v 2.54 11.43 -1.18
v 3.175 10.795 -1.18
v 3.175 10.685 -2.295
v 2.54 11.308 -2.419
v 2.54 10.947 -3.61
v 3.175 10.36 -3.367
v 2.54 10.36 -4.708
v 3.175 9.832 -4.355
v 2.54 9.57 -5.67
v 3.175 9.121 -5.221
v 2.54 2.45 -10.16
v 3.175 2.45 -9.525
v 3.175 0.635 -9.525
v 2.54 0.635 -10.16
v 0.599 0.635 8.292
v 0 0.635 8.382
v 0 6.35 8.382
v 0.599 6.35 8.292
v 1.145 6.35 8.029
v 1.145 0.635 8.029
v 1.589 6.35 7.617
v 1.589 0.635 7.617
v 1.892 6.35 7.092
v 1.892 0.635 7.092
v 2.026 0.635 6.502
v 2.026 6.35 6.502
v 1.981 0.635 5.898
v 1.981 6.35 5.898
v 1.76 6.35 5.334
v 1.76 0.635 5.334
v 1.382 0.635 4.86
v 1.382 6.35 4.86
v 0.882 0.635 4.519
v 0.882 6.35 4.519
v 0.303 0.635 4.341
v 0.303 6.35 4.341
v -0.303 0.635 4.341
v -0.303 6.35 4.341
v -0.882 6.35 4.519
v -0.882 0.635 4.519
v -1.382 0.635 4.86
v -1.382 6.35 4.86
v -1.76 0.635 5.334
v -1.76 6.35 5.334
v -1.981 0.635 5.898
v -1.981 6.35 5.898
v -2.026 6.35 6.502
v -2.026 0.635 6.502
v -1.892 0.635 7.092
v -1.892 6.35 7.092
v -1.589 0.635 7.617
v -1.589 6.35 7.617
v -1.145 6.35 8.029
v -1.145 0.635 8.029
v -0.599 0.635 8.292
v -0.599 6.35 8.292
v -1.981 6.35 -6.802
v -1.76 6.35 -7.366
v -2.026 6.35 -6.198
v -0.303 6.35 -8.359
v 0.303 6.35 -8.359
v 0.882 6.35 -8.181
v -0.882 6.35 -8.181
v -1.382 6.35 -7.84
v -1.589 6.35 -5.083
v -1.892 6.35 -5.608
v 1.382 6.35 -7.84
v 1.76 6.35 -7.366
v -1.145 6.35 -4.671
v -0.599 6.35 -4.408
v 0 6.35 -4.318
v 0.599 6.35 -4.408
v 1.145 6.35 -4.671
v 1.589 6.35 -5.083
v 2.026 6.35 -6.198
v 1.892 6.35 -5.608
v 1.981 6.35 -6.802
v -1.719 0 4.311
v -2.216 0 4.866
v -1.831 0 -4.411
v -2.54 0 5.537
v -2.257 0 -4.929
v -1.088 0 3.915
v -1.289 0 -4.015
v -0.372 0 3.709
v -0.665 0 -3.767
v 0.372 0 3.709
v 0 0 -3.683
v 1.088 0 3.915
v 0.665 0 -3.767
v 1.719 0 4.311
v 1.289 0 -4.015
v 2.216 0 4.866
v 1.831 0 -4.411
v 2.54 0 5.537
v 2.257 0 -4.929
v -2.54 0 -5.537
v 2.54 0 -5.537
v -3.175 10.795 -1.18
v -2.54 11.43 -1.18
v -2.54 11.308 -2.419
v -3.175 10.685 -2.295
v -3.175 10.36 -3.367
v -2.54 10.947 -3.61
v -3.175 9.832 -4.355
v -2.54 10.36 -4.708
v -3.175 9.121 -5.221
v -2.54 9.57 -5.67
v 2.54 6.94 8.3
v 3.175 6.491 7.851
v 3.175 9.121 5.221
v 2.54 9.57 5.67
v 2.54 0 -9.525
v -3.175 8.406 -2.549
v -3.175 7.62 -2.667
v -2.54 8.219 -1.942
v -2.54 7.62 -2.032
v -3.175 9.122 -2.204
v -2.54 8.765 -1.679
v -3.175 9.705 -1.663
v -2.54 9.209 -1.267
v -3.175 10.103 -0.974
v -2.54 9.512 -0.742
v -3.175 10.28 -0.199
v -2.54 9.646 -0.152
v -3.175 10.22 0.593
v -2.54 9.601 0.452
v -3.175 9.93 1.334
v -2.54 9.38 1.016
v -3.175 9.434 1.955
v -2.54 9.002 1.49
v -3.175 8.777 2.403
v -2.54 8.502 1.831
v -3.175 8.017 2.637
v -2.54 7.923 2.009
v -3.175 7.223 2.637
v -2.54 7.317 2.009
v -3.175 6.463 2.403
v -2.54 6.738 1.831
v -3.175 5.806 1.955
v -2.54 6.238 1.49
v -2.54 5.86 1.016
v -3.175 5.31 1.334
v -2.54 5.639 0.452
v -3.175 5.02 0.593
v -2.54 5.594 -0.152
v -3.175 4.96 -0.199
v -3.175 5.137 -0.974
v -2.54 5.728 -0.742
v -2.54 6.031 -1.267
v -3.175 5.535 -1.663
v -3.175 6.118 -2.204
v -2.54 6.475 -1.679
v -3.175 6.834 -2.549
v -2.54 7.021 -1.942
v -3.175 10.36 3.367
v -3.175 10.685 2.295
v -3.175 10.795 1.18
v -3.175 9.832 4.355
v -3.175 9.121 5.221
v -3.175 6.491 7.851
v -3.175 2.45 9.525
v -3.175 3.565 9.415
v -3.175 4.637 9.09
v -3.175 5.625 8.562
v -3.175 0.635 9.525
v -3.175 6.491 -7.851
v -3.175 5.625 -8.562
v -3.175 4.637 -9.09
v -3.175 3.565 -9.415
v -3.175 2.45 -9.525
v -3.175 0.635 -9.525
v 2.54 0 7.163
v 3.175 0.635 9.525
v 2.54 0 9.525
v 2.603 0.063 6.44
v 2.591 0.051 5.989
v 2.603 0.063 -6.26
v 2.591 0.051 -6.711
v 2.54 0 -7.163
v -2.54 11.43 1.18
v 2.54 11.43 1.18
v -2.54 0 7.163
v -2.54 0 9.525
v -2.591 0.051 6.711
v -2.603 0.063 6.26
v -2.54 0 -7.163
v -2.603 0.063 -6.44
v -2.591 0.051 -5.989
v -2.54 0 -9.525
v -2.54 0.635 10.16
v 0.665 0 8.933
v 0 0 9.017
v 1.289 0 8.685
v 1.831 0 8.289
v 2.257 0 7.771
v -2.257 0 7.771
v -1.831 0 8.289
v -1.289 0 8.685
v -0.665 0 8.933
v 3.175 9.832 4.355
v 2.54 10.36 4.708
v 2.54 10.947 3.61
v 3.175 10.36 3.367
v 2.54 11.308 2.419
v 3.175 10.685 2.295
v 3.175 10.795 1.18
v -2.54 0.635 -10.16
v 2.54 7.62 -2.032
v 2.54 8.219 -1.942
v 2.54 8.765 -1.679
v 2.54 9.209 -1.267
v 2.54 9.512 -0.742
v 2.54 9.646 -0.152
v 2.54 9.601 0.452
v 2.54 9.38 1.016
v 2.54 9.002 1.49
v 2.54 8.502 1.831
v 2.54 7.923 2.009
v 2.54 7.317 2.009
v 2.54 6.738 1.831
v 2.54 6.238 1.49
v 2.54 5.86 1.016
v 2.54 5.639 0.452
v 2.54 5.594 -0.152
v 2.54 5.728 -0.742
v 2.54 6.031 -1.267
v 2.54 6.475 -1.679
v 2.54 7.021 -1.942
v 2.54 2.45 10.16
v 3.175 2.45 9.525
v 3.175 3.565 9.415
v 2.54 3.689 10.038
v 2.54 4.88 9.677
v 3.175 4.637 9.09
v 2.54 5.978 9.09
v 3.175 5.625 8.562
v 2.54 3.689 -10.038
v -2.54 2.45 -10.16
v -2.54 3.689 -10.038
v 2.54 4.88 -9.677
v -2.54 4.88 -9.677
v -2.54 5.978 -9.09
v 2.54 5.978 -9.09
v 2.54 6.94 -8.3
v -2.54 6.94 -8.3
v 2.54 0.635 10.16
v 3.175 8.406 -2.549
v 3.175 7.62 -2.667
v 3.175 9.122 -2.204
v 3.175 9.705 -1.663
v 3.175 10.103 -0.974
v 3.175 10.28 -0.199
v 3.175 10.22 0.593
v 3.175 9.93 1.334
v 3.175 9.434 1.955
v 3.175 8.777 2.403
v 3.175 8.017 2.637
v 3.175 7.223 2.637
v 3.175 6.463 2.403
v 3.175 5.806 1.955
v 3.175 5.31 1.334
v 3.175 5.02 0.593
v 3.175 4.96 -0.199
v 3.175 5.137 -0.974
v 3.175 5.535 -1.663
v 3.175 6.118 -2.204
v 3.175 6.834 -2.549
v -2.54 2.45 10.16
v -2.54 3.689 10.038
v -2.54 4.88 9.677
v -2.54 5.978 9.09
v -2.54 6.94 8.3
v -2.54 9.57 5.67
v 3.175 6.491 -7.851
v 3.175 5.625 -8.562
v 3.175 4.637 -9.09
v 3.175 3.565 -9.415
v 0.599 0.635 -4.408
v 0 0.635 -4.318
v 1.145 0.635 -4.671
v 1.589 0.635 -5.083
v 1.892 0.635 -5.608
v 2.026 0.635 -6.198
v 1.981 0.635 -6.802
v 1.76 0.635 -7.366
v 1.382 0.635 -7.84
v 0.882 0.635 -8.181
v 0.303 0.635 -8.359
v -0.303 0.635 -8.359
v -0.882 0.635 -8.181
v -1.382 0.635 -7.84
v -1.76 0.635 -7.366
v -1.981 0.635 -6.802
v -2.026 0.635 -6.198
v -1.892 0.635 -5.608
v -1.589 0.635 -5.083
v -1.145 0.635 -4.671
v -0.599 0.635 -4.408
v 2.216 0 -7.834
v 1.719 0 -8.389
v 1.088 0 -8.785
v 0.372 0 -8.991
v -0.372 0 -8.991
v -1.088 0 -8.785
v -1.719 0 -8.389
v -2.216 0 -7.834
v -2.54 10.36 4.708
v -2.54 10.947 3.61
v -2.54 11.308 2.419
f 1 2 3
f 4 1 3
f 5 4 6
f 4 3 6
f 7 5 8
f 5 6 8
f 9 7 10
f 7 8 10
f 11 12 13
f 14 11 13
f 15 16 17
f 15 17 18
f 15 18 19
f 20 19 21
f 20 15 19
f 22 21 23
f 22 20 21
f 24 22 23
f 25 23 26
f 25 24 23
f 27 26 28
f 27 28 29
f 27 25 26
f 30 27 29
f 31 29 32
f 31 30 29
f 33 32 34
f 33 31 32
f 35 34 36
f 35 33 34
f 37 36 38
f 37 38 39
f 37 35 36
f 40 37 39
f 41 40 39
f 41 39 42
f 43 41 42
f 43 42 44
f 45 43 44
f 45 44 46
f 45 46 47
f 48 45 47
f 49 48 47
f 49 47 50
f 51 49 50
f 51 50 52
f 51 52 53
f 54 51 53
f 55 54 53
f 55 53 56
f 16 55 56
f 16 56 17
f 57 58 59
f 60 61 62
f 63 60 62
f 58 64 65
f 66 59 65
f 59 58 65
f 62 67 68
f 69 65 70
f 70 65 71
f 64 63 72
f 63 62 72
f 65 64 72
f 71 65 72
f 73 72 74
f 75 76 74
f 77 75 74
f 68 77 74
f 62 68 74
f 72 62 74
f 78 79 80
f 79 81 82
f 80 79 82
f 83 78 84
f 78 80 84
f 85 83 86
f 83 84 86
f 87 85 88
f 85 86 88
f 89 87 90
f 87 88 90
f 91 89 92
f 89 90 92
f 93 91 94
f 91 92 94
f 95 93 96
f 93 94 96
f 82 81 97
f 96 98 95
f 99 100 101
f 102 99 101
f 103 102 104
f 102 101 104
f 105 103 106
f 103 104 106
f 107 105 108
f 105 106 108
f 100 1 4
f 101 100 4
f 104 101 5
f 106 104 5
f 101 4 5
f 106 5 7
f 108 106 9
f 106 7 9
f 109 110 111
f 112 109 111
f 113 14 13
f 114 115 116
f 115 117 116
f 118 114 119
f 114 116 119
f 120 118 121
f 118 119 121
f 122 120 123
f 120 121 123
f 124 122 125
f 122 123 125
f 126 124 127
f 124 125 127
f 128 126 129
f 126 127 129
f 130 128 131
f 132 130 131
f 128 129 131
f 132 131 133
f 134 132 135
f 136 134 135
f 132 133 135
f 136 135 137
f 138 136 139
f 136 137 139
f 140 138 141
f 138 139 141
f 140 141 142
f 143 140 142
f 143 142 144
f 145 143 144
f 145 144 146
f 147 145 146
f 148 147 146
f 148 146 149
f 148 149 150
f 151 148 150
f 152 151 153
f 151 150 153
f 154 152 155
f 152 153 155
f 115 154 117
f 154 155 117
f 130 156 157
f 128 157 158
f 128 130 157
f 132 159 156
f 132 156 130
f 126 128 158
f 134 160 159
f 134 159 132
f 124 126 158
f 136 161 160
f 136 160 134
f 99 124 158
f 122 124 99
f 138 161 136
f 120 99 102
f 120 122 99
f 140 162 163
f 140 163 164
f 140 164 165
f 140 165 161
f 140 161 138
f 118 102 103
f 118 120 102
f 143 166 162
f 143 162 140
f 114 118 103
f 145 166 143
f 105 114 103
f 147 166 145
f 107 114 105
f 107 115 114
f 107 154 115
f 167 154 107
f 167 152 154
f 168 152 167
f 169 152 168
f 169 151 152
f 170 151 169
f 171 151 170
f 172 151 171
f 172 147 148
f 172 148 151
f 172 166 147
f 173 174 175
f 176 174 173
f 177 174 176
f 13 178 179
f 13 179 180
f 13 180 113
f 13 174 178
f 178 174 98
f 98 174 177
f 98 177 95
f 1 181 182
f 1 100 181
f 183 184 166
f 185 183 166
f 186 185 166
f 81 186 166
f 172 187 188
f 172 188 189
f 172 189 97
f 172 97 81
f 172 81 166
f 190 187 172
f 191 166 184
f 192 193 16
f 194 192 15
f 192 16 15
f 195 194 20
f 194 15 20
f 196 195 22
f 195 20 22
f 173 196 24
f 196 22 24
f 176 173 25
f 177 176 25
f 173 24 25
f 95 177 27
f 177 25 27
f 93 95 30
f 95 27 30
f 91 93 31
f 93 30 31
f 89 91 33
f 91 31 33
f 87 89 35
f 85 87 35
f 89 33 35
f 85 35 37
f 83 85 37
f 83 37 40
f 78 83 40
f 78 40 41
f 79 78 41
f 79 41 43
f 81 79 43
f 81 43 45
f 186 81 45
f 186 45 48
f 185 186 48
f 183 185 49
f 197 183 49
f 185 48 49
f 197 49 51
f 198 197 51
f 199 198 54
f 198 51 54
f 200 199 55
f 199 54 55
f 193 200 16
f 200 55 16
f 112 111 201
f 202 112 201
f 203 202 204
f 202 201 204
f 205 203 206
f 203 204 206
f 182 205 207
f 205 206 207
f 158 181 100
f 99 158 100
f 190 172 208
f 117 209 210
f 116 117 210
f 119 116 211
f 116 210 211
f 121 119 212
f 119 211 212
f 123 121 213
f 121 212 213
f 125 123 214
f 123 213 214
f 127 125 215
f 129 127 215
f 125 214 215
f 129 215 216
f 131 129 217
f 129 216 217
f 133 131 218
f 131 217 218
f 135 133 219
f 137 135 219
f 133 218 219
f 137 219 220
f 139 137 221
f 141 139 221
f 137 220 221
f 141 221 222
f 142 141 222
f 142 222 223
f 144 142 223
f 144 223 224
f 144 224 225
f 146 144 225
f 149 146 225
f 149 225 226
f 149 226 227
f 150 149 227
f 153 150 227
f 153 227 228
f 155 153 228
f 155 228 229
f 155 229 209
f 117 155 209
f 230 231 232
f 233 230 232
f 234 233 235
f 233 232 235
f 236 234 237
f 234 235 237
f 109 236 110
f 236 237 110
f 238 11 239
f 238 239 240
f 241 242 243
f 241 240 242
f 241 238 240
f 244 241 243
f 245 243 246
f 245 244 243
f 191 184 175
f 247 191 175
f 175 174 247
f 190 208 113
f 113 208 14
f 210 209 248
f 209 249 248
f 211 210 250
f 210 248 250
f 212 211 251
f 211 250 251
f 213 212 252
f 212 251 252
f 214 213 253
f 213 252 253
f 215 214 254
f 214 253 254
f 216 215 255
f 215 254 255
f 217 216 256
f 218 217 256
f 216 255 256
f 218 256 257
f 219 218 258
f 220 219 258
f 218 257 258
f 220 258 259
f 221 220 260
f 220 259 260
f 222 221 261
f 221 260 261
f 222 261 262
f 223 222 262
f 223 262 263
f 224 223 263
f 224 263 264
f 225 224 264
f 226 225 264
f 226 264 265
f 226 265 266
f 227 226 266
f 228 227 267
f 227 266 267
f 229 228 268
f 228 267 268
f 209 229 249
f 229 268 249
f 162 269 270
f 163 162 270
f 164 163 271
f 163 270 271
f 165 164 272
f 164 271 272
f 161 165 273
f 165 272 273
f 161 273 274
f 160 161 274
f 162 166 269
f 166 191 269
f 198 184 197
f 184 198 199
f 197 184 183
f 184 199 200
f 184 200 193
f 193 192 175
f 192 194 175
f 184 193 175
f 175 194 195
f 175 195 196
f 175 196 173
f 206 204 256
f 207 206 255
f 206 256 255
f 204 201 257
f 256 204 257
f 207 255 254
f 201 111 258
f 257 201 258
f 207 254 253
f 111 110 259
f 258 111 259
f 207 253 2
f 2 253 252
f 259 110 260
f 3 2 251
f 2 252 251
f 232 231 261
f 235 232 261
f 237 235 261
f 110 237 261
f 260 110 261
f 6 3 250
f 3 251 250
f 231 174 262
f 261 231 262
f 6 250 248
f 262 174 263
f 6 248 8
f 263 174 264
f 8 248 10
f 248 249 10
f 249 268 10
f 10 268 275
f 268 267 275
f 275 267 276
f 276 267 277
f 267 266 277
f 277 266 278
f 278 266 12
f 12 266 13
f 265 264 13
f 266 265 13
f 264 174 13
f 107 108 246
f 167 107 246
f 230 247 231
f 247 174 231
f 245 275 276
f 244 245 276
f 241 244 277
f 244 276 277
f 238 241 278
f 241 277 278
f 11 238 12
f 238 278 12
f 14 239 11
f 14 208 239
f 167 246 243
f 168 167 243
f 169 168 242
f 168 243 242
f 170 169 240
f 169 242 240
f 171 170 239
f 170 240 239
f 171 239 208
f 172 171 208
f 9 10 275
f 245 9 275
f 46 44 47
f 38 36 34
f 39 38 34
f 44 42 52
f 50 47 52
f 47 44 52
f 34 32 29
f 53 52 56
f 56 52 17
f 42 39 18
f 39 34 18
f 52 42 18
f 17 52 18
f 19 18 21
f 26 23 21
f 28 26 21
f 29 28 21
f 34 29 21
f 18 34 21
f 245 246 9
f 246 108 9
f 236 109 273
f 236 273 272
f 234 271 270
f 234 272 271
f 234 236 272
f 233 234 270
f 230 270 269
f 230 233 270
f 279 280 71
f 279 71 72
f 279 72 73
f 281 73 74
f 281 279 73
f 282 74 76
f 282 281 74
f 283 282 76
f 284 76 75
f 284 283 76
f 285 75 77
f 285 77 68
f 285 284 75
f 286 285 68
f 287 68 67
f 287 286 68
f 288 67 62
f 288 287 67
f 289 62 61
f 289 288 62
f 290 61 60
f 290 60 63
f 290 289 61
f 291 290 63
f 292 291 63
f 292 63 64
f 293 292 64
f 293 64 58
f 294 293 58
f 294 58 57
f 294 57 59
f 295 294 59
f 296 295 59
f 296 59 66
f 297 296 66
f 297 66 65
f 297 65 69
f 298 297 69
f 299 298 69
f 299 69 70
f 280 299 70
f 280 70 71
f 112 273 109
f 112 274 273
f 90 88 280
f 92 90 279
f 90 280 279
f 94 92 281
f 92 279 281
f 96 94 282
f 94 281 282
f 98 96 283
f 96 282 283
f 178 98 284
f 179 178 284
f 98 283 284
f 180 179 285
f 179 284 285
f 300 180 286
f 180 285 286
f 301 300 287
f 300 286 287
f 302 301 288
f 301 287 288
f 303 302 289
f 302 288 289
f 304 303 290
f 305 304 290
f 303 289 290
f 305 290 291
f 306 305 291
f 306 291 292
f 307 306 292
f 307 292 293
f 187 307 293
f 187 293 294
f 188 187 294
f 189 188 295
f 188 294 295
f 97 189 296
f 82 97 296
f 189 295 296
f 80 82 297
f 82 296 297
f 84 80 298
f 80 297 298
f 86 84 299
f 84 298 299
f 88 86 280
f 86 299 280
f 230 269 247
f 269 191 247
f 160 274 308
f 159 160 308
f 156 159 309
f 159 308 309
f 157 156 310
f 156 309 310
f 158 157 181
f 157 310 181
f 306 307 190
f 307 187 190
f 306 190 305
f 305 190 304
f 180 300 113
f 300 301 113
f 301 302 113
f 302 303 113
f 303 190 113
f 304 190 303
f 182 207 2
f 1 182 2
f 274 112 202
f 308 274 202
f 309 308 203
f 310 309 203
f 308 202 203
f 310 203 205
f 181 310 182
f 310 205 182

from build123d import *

# Parameters (mm, degrees)
SKETCH1_W           = 6.35
SKETCH1_H           = 20.32
SKETCH1_R           = 2.032
BOSS_EXTRUDE1_DEPTH = 11.43
SKETCH1_3_R         = 2.032
CUT_EXTRUDE1_DEPTH  = 6.35
SKETCH2_R           = 2.032
CUT_EXTRUDE2_DEPTH  = 17.558774109
CHAMFER1_SIZE       = 6.35
FILLET1_R           = 6.35
FILLET2_R           = 6.35
CHAMFER2_SIZE       = 0.635
CHAMFER3_SIZE       = 0.635


with BuildPart() as part:
    # Sketch1 → Boss-Extrude1 (new body)
    # profile 1 of 3: a face of its own
    with BuildSketch(Plane(origin=(0, 0, 0), x_dir=(1, 0, 0), z_dir=(0, 1, 0))):
        Rectangle(SKETCH1_W, SKETCH1_H)
        with Locations((0, -6.35)):
            Circle(SKETCH1_R, mode=Mode.SUBTRACT)
        with Locations((0, 6.35)):
            Circle(SKETCH1_R, mode=Mode.SUBTRACT)
    # profile 2 of 3: a face of its own
    with BuildSketch(Plane(origin=(0, 0, 0), x_dir=(1, 0, 0), z_dir=(0, 1, 0))):
        with Locations((0, -6.35)):
            Circle(SKETCH1_R)
    # profile 3 of 3: a face of its own
    with BuildSketch(Plane(origin=(0, 0, 0), x_dir=(1, 0, 0), z_dir=(0, 1, 0))):
        with Locations((0, 6.35)):
            Circle(SKETCH1_R)
    extrude(amount=BOSS_EXTRUDE1_DEPTH)

    # Sketch1<3> → Cut-Extrude1 (cut)
    with BuildSketch(Plane(origin=(0, 0, 0), x_dir=(1, 0, 0), z_dir=(0, 1, 0))):
        with Locations(Location((0, 6.35, 0), (0, 0, 270))):
            Circle(SKETCH1_3_R)
        with Locations(Location((0, -6.35, 0), (0, 0, 270))):
            Circle(SKETCH1_3_R)
    extrude(amount=CUT_EXTRUDE1_DEPTH, mode=Mode.SUBTRACT)

    # Sketch2 → Cut-Extrude2 (cut, through all)
    with BuildSketch(Plane(origin=(3.175, 0, 0), x_dir=(0, 0, -1), z_dir=(1, 0, 0))):
        with Locations((0, 7.62)):
            Circle(SKETCH2_R)
    extrude(amount=-CUT_EXTRUDE2_DEPTH, mode=Mode.SUBTRACT)

    # Chamfer1
    chamfer1_edges = [part.edges().sort_by_distance(p)[0] for p in [
        (0, 11.43, -10.16),
        (0, 11.43, 10.16),
    ]]
    chamfer(chamfer1_edges, length=CHAMFER1_SIZE)

    # Fillet1
    fillet1_edges = [part.edges().sort_by_distance(p)[0] for p in [
        (0, 11.43, 3.81),
        (0, 11.43, -3.81),
    ]]
    fillet(fillet1_edges, radius=FILLET1_R)

    # Fillet2
    fillet2_edges = [part.edges().sort_by_distance(p)[0] for p in [
        (0, 5.08, -10.16),
        (0, 5.08, 10.16),
    ]]
    fillet(fillet2_edges, radius=FILLET2_R)

    # Chamfer2
    chamfer2_edges = [part.edges().sort_by_distance(p)[0] for p in [
        (3.175, 11.43, 0),
        (-3.175, 11.43, 0),
        (-3.175, 8.255, -6.985),
        (-3.175, 10.946635031, 3.609783674),
        (-3.175, 10.946635031, -3.609783674),
        (3.175, 8.255, 6.985),
        (3.175, 10.946635031, 3.609783674),
        (3.175, 10.946635031, -3.609783674),
        (-3.175, 0, 0),
        (-3.175, 1.224871939, -10.16),
        (3.175, 1.224871939, -10.16),
        (3.175, 8.255, -6.985),
        (3.175, 1.224871939, 10.16),
        (3.175, 4.879783674, 9.676635031),
        (3.175, 4.879783674, -9.676635031),
        (-3.175, 1.224871939, 10.16),
        (0, 0, -10.16),
        (-3.175, 8.255, 6.985),
        (-3.175, 4.879783674, 9.676635031),
        (-3.175, 4.879783674, -9.676635031),
        (3.175, 0, 0),
        (0, 0, 10.16),
    ]]
    chamfer(chamfer2_edges, length=CHAMFER2_SIZE)

    # Chamfer3
    # the kernel refuses this chamfer: 0.635 mm, written as the material it takes off along each edge
    with BuildSketch(Plane(origin=(0, 0, 6.35), x_dir=(0, 0, 1), z_dir=(-1, 0, 0))) as chamfer3_piece_1:
        Polygon((2.032 + CHAMFER3_SIZE, 0), (2.032, CHAMFER3_SIZE), (2.032, 0), align=None)
    revolve(axis=Axis((0, 0, 6.35), (0, 1, 0)), mode=Mode.SUBTRACT)
    with BuildSketch(Plane(origin=(0, 0, -6.35), x_dir=(0, 0, 1), z_dir=(-1, 0, 0))) as chamfer3_piece_2:
        Polygon((2.032 + CHAMFER3_SIZE, 0), (2.032, CHAMFER3_SIZE), (2.032, 0), align=None)
    revolve(axis=Axis((0, 0, -6.35), (0, 1, 0)), mode=Mode.SUBTRACT)
    with BuildSketch(Plane(origin=(-3.175, 7.62, 0), x_dir=(0, 0, -1), z_dir=(0, -1, 0))) as chamfer3_piece_3:
        Polygon((2.032 + CHAMFER3_SIZE, 0), (2.032, CHAMFER3_SIZE), (2.032, 0), align=None)
    revolve(axis=Axis((-3.175, 7.62, 0), (1, 0, 0)), mode=Mode.SUBTRACT)
    with BuildSketch(Plane(origin=(3.175, 7.62, 0), x_dir=(0, 0, -1), z_dir=(0, -1, 0))) as chamfer3_piece_4:
        Polygon((2.032, -CHAMFER3_SIZE), (2.032 + CHAMFER3_SIZE, 0), (2.032, 0), align=None)
    revolve(axis=Axis((3.175, 7.62, 0), (1, 0, 0)), mode=Mode.SUBTRACT)


solid = part.part
